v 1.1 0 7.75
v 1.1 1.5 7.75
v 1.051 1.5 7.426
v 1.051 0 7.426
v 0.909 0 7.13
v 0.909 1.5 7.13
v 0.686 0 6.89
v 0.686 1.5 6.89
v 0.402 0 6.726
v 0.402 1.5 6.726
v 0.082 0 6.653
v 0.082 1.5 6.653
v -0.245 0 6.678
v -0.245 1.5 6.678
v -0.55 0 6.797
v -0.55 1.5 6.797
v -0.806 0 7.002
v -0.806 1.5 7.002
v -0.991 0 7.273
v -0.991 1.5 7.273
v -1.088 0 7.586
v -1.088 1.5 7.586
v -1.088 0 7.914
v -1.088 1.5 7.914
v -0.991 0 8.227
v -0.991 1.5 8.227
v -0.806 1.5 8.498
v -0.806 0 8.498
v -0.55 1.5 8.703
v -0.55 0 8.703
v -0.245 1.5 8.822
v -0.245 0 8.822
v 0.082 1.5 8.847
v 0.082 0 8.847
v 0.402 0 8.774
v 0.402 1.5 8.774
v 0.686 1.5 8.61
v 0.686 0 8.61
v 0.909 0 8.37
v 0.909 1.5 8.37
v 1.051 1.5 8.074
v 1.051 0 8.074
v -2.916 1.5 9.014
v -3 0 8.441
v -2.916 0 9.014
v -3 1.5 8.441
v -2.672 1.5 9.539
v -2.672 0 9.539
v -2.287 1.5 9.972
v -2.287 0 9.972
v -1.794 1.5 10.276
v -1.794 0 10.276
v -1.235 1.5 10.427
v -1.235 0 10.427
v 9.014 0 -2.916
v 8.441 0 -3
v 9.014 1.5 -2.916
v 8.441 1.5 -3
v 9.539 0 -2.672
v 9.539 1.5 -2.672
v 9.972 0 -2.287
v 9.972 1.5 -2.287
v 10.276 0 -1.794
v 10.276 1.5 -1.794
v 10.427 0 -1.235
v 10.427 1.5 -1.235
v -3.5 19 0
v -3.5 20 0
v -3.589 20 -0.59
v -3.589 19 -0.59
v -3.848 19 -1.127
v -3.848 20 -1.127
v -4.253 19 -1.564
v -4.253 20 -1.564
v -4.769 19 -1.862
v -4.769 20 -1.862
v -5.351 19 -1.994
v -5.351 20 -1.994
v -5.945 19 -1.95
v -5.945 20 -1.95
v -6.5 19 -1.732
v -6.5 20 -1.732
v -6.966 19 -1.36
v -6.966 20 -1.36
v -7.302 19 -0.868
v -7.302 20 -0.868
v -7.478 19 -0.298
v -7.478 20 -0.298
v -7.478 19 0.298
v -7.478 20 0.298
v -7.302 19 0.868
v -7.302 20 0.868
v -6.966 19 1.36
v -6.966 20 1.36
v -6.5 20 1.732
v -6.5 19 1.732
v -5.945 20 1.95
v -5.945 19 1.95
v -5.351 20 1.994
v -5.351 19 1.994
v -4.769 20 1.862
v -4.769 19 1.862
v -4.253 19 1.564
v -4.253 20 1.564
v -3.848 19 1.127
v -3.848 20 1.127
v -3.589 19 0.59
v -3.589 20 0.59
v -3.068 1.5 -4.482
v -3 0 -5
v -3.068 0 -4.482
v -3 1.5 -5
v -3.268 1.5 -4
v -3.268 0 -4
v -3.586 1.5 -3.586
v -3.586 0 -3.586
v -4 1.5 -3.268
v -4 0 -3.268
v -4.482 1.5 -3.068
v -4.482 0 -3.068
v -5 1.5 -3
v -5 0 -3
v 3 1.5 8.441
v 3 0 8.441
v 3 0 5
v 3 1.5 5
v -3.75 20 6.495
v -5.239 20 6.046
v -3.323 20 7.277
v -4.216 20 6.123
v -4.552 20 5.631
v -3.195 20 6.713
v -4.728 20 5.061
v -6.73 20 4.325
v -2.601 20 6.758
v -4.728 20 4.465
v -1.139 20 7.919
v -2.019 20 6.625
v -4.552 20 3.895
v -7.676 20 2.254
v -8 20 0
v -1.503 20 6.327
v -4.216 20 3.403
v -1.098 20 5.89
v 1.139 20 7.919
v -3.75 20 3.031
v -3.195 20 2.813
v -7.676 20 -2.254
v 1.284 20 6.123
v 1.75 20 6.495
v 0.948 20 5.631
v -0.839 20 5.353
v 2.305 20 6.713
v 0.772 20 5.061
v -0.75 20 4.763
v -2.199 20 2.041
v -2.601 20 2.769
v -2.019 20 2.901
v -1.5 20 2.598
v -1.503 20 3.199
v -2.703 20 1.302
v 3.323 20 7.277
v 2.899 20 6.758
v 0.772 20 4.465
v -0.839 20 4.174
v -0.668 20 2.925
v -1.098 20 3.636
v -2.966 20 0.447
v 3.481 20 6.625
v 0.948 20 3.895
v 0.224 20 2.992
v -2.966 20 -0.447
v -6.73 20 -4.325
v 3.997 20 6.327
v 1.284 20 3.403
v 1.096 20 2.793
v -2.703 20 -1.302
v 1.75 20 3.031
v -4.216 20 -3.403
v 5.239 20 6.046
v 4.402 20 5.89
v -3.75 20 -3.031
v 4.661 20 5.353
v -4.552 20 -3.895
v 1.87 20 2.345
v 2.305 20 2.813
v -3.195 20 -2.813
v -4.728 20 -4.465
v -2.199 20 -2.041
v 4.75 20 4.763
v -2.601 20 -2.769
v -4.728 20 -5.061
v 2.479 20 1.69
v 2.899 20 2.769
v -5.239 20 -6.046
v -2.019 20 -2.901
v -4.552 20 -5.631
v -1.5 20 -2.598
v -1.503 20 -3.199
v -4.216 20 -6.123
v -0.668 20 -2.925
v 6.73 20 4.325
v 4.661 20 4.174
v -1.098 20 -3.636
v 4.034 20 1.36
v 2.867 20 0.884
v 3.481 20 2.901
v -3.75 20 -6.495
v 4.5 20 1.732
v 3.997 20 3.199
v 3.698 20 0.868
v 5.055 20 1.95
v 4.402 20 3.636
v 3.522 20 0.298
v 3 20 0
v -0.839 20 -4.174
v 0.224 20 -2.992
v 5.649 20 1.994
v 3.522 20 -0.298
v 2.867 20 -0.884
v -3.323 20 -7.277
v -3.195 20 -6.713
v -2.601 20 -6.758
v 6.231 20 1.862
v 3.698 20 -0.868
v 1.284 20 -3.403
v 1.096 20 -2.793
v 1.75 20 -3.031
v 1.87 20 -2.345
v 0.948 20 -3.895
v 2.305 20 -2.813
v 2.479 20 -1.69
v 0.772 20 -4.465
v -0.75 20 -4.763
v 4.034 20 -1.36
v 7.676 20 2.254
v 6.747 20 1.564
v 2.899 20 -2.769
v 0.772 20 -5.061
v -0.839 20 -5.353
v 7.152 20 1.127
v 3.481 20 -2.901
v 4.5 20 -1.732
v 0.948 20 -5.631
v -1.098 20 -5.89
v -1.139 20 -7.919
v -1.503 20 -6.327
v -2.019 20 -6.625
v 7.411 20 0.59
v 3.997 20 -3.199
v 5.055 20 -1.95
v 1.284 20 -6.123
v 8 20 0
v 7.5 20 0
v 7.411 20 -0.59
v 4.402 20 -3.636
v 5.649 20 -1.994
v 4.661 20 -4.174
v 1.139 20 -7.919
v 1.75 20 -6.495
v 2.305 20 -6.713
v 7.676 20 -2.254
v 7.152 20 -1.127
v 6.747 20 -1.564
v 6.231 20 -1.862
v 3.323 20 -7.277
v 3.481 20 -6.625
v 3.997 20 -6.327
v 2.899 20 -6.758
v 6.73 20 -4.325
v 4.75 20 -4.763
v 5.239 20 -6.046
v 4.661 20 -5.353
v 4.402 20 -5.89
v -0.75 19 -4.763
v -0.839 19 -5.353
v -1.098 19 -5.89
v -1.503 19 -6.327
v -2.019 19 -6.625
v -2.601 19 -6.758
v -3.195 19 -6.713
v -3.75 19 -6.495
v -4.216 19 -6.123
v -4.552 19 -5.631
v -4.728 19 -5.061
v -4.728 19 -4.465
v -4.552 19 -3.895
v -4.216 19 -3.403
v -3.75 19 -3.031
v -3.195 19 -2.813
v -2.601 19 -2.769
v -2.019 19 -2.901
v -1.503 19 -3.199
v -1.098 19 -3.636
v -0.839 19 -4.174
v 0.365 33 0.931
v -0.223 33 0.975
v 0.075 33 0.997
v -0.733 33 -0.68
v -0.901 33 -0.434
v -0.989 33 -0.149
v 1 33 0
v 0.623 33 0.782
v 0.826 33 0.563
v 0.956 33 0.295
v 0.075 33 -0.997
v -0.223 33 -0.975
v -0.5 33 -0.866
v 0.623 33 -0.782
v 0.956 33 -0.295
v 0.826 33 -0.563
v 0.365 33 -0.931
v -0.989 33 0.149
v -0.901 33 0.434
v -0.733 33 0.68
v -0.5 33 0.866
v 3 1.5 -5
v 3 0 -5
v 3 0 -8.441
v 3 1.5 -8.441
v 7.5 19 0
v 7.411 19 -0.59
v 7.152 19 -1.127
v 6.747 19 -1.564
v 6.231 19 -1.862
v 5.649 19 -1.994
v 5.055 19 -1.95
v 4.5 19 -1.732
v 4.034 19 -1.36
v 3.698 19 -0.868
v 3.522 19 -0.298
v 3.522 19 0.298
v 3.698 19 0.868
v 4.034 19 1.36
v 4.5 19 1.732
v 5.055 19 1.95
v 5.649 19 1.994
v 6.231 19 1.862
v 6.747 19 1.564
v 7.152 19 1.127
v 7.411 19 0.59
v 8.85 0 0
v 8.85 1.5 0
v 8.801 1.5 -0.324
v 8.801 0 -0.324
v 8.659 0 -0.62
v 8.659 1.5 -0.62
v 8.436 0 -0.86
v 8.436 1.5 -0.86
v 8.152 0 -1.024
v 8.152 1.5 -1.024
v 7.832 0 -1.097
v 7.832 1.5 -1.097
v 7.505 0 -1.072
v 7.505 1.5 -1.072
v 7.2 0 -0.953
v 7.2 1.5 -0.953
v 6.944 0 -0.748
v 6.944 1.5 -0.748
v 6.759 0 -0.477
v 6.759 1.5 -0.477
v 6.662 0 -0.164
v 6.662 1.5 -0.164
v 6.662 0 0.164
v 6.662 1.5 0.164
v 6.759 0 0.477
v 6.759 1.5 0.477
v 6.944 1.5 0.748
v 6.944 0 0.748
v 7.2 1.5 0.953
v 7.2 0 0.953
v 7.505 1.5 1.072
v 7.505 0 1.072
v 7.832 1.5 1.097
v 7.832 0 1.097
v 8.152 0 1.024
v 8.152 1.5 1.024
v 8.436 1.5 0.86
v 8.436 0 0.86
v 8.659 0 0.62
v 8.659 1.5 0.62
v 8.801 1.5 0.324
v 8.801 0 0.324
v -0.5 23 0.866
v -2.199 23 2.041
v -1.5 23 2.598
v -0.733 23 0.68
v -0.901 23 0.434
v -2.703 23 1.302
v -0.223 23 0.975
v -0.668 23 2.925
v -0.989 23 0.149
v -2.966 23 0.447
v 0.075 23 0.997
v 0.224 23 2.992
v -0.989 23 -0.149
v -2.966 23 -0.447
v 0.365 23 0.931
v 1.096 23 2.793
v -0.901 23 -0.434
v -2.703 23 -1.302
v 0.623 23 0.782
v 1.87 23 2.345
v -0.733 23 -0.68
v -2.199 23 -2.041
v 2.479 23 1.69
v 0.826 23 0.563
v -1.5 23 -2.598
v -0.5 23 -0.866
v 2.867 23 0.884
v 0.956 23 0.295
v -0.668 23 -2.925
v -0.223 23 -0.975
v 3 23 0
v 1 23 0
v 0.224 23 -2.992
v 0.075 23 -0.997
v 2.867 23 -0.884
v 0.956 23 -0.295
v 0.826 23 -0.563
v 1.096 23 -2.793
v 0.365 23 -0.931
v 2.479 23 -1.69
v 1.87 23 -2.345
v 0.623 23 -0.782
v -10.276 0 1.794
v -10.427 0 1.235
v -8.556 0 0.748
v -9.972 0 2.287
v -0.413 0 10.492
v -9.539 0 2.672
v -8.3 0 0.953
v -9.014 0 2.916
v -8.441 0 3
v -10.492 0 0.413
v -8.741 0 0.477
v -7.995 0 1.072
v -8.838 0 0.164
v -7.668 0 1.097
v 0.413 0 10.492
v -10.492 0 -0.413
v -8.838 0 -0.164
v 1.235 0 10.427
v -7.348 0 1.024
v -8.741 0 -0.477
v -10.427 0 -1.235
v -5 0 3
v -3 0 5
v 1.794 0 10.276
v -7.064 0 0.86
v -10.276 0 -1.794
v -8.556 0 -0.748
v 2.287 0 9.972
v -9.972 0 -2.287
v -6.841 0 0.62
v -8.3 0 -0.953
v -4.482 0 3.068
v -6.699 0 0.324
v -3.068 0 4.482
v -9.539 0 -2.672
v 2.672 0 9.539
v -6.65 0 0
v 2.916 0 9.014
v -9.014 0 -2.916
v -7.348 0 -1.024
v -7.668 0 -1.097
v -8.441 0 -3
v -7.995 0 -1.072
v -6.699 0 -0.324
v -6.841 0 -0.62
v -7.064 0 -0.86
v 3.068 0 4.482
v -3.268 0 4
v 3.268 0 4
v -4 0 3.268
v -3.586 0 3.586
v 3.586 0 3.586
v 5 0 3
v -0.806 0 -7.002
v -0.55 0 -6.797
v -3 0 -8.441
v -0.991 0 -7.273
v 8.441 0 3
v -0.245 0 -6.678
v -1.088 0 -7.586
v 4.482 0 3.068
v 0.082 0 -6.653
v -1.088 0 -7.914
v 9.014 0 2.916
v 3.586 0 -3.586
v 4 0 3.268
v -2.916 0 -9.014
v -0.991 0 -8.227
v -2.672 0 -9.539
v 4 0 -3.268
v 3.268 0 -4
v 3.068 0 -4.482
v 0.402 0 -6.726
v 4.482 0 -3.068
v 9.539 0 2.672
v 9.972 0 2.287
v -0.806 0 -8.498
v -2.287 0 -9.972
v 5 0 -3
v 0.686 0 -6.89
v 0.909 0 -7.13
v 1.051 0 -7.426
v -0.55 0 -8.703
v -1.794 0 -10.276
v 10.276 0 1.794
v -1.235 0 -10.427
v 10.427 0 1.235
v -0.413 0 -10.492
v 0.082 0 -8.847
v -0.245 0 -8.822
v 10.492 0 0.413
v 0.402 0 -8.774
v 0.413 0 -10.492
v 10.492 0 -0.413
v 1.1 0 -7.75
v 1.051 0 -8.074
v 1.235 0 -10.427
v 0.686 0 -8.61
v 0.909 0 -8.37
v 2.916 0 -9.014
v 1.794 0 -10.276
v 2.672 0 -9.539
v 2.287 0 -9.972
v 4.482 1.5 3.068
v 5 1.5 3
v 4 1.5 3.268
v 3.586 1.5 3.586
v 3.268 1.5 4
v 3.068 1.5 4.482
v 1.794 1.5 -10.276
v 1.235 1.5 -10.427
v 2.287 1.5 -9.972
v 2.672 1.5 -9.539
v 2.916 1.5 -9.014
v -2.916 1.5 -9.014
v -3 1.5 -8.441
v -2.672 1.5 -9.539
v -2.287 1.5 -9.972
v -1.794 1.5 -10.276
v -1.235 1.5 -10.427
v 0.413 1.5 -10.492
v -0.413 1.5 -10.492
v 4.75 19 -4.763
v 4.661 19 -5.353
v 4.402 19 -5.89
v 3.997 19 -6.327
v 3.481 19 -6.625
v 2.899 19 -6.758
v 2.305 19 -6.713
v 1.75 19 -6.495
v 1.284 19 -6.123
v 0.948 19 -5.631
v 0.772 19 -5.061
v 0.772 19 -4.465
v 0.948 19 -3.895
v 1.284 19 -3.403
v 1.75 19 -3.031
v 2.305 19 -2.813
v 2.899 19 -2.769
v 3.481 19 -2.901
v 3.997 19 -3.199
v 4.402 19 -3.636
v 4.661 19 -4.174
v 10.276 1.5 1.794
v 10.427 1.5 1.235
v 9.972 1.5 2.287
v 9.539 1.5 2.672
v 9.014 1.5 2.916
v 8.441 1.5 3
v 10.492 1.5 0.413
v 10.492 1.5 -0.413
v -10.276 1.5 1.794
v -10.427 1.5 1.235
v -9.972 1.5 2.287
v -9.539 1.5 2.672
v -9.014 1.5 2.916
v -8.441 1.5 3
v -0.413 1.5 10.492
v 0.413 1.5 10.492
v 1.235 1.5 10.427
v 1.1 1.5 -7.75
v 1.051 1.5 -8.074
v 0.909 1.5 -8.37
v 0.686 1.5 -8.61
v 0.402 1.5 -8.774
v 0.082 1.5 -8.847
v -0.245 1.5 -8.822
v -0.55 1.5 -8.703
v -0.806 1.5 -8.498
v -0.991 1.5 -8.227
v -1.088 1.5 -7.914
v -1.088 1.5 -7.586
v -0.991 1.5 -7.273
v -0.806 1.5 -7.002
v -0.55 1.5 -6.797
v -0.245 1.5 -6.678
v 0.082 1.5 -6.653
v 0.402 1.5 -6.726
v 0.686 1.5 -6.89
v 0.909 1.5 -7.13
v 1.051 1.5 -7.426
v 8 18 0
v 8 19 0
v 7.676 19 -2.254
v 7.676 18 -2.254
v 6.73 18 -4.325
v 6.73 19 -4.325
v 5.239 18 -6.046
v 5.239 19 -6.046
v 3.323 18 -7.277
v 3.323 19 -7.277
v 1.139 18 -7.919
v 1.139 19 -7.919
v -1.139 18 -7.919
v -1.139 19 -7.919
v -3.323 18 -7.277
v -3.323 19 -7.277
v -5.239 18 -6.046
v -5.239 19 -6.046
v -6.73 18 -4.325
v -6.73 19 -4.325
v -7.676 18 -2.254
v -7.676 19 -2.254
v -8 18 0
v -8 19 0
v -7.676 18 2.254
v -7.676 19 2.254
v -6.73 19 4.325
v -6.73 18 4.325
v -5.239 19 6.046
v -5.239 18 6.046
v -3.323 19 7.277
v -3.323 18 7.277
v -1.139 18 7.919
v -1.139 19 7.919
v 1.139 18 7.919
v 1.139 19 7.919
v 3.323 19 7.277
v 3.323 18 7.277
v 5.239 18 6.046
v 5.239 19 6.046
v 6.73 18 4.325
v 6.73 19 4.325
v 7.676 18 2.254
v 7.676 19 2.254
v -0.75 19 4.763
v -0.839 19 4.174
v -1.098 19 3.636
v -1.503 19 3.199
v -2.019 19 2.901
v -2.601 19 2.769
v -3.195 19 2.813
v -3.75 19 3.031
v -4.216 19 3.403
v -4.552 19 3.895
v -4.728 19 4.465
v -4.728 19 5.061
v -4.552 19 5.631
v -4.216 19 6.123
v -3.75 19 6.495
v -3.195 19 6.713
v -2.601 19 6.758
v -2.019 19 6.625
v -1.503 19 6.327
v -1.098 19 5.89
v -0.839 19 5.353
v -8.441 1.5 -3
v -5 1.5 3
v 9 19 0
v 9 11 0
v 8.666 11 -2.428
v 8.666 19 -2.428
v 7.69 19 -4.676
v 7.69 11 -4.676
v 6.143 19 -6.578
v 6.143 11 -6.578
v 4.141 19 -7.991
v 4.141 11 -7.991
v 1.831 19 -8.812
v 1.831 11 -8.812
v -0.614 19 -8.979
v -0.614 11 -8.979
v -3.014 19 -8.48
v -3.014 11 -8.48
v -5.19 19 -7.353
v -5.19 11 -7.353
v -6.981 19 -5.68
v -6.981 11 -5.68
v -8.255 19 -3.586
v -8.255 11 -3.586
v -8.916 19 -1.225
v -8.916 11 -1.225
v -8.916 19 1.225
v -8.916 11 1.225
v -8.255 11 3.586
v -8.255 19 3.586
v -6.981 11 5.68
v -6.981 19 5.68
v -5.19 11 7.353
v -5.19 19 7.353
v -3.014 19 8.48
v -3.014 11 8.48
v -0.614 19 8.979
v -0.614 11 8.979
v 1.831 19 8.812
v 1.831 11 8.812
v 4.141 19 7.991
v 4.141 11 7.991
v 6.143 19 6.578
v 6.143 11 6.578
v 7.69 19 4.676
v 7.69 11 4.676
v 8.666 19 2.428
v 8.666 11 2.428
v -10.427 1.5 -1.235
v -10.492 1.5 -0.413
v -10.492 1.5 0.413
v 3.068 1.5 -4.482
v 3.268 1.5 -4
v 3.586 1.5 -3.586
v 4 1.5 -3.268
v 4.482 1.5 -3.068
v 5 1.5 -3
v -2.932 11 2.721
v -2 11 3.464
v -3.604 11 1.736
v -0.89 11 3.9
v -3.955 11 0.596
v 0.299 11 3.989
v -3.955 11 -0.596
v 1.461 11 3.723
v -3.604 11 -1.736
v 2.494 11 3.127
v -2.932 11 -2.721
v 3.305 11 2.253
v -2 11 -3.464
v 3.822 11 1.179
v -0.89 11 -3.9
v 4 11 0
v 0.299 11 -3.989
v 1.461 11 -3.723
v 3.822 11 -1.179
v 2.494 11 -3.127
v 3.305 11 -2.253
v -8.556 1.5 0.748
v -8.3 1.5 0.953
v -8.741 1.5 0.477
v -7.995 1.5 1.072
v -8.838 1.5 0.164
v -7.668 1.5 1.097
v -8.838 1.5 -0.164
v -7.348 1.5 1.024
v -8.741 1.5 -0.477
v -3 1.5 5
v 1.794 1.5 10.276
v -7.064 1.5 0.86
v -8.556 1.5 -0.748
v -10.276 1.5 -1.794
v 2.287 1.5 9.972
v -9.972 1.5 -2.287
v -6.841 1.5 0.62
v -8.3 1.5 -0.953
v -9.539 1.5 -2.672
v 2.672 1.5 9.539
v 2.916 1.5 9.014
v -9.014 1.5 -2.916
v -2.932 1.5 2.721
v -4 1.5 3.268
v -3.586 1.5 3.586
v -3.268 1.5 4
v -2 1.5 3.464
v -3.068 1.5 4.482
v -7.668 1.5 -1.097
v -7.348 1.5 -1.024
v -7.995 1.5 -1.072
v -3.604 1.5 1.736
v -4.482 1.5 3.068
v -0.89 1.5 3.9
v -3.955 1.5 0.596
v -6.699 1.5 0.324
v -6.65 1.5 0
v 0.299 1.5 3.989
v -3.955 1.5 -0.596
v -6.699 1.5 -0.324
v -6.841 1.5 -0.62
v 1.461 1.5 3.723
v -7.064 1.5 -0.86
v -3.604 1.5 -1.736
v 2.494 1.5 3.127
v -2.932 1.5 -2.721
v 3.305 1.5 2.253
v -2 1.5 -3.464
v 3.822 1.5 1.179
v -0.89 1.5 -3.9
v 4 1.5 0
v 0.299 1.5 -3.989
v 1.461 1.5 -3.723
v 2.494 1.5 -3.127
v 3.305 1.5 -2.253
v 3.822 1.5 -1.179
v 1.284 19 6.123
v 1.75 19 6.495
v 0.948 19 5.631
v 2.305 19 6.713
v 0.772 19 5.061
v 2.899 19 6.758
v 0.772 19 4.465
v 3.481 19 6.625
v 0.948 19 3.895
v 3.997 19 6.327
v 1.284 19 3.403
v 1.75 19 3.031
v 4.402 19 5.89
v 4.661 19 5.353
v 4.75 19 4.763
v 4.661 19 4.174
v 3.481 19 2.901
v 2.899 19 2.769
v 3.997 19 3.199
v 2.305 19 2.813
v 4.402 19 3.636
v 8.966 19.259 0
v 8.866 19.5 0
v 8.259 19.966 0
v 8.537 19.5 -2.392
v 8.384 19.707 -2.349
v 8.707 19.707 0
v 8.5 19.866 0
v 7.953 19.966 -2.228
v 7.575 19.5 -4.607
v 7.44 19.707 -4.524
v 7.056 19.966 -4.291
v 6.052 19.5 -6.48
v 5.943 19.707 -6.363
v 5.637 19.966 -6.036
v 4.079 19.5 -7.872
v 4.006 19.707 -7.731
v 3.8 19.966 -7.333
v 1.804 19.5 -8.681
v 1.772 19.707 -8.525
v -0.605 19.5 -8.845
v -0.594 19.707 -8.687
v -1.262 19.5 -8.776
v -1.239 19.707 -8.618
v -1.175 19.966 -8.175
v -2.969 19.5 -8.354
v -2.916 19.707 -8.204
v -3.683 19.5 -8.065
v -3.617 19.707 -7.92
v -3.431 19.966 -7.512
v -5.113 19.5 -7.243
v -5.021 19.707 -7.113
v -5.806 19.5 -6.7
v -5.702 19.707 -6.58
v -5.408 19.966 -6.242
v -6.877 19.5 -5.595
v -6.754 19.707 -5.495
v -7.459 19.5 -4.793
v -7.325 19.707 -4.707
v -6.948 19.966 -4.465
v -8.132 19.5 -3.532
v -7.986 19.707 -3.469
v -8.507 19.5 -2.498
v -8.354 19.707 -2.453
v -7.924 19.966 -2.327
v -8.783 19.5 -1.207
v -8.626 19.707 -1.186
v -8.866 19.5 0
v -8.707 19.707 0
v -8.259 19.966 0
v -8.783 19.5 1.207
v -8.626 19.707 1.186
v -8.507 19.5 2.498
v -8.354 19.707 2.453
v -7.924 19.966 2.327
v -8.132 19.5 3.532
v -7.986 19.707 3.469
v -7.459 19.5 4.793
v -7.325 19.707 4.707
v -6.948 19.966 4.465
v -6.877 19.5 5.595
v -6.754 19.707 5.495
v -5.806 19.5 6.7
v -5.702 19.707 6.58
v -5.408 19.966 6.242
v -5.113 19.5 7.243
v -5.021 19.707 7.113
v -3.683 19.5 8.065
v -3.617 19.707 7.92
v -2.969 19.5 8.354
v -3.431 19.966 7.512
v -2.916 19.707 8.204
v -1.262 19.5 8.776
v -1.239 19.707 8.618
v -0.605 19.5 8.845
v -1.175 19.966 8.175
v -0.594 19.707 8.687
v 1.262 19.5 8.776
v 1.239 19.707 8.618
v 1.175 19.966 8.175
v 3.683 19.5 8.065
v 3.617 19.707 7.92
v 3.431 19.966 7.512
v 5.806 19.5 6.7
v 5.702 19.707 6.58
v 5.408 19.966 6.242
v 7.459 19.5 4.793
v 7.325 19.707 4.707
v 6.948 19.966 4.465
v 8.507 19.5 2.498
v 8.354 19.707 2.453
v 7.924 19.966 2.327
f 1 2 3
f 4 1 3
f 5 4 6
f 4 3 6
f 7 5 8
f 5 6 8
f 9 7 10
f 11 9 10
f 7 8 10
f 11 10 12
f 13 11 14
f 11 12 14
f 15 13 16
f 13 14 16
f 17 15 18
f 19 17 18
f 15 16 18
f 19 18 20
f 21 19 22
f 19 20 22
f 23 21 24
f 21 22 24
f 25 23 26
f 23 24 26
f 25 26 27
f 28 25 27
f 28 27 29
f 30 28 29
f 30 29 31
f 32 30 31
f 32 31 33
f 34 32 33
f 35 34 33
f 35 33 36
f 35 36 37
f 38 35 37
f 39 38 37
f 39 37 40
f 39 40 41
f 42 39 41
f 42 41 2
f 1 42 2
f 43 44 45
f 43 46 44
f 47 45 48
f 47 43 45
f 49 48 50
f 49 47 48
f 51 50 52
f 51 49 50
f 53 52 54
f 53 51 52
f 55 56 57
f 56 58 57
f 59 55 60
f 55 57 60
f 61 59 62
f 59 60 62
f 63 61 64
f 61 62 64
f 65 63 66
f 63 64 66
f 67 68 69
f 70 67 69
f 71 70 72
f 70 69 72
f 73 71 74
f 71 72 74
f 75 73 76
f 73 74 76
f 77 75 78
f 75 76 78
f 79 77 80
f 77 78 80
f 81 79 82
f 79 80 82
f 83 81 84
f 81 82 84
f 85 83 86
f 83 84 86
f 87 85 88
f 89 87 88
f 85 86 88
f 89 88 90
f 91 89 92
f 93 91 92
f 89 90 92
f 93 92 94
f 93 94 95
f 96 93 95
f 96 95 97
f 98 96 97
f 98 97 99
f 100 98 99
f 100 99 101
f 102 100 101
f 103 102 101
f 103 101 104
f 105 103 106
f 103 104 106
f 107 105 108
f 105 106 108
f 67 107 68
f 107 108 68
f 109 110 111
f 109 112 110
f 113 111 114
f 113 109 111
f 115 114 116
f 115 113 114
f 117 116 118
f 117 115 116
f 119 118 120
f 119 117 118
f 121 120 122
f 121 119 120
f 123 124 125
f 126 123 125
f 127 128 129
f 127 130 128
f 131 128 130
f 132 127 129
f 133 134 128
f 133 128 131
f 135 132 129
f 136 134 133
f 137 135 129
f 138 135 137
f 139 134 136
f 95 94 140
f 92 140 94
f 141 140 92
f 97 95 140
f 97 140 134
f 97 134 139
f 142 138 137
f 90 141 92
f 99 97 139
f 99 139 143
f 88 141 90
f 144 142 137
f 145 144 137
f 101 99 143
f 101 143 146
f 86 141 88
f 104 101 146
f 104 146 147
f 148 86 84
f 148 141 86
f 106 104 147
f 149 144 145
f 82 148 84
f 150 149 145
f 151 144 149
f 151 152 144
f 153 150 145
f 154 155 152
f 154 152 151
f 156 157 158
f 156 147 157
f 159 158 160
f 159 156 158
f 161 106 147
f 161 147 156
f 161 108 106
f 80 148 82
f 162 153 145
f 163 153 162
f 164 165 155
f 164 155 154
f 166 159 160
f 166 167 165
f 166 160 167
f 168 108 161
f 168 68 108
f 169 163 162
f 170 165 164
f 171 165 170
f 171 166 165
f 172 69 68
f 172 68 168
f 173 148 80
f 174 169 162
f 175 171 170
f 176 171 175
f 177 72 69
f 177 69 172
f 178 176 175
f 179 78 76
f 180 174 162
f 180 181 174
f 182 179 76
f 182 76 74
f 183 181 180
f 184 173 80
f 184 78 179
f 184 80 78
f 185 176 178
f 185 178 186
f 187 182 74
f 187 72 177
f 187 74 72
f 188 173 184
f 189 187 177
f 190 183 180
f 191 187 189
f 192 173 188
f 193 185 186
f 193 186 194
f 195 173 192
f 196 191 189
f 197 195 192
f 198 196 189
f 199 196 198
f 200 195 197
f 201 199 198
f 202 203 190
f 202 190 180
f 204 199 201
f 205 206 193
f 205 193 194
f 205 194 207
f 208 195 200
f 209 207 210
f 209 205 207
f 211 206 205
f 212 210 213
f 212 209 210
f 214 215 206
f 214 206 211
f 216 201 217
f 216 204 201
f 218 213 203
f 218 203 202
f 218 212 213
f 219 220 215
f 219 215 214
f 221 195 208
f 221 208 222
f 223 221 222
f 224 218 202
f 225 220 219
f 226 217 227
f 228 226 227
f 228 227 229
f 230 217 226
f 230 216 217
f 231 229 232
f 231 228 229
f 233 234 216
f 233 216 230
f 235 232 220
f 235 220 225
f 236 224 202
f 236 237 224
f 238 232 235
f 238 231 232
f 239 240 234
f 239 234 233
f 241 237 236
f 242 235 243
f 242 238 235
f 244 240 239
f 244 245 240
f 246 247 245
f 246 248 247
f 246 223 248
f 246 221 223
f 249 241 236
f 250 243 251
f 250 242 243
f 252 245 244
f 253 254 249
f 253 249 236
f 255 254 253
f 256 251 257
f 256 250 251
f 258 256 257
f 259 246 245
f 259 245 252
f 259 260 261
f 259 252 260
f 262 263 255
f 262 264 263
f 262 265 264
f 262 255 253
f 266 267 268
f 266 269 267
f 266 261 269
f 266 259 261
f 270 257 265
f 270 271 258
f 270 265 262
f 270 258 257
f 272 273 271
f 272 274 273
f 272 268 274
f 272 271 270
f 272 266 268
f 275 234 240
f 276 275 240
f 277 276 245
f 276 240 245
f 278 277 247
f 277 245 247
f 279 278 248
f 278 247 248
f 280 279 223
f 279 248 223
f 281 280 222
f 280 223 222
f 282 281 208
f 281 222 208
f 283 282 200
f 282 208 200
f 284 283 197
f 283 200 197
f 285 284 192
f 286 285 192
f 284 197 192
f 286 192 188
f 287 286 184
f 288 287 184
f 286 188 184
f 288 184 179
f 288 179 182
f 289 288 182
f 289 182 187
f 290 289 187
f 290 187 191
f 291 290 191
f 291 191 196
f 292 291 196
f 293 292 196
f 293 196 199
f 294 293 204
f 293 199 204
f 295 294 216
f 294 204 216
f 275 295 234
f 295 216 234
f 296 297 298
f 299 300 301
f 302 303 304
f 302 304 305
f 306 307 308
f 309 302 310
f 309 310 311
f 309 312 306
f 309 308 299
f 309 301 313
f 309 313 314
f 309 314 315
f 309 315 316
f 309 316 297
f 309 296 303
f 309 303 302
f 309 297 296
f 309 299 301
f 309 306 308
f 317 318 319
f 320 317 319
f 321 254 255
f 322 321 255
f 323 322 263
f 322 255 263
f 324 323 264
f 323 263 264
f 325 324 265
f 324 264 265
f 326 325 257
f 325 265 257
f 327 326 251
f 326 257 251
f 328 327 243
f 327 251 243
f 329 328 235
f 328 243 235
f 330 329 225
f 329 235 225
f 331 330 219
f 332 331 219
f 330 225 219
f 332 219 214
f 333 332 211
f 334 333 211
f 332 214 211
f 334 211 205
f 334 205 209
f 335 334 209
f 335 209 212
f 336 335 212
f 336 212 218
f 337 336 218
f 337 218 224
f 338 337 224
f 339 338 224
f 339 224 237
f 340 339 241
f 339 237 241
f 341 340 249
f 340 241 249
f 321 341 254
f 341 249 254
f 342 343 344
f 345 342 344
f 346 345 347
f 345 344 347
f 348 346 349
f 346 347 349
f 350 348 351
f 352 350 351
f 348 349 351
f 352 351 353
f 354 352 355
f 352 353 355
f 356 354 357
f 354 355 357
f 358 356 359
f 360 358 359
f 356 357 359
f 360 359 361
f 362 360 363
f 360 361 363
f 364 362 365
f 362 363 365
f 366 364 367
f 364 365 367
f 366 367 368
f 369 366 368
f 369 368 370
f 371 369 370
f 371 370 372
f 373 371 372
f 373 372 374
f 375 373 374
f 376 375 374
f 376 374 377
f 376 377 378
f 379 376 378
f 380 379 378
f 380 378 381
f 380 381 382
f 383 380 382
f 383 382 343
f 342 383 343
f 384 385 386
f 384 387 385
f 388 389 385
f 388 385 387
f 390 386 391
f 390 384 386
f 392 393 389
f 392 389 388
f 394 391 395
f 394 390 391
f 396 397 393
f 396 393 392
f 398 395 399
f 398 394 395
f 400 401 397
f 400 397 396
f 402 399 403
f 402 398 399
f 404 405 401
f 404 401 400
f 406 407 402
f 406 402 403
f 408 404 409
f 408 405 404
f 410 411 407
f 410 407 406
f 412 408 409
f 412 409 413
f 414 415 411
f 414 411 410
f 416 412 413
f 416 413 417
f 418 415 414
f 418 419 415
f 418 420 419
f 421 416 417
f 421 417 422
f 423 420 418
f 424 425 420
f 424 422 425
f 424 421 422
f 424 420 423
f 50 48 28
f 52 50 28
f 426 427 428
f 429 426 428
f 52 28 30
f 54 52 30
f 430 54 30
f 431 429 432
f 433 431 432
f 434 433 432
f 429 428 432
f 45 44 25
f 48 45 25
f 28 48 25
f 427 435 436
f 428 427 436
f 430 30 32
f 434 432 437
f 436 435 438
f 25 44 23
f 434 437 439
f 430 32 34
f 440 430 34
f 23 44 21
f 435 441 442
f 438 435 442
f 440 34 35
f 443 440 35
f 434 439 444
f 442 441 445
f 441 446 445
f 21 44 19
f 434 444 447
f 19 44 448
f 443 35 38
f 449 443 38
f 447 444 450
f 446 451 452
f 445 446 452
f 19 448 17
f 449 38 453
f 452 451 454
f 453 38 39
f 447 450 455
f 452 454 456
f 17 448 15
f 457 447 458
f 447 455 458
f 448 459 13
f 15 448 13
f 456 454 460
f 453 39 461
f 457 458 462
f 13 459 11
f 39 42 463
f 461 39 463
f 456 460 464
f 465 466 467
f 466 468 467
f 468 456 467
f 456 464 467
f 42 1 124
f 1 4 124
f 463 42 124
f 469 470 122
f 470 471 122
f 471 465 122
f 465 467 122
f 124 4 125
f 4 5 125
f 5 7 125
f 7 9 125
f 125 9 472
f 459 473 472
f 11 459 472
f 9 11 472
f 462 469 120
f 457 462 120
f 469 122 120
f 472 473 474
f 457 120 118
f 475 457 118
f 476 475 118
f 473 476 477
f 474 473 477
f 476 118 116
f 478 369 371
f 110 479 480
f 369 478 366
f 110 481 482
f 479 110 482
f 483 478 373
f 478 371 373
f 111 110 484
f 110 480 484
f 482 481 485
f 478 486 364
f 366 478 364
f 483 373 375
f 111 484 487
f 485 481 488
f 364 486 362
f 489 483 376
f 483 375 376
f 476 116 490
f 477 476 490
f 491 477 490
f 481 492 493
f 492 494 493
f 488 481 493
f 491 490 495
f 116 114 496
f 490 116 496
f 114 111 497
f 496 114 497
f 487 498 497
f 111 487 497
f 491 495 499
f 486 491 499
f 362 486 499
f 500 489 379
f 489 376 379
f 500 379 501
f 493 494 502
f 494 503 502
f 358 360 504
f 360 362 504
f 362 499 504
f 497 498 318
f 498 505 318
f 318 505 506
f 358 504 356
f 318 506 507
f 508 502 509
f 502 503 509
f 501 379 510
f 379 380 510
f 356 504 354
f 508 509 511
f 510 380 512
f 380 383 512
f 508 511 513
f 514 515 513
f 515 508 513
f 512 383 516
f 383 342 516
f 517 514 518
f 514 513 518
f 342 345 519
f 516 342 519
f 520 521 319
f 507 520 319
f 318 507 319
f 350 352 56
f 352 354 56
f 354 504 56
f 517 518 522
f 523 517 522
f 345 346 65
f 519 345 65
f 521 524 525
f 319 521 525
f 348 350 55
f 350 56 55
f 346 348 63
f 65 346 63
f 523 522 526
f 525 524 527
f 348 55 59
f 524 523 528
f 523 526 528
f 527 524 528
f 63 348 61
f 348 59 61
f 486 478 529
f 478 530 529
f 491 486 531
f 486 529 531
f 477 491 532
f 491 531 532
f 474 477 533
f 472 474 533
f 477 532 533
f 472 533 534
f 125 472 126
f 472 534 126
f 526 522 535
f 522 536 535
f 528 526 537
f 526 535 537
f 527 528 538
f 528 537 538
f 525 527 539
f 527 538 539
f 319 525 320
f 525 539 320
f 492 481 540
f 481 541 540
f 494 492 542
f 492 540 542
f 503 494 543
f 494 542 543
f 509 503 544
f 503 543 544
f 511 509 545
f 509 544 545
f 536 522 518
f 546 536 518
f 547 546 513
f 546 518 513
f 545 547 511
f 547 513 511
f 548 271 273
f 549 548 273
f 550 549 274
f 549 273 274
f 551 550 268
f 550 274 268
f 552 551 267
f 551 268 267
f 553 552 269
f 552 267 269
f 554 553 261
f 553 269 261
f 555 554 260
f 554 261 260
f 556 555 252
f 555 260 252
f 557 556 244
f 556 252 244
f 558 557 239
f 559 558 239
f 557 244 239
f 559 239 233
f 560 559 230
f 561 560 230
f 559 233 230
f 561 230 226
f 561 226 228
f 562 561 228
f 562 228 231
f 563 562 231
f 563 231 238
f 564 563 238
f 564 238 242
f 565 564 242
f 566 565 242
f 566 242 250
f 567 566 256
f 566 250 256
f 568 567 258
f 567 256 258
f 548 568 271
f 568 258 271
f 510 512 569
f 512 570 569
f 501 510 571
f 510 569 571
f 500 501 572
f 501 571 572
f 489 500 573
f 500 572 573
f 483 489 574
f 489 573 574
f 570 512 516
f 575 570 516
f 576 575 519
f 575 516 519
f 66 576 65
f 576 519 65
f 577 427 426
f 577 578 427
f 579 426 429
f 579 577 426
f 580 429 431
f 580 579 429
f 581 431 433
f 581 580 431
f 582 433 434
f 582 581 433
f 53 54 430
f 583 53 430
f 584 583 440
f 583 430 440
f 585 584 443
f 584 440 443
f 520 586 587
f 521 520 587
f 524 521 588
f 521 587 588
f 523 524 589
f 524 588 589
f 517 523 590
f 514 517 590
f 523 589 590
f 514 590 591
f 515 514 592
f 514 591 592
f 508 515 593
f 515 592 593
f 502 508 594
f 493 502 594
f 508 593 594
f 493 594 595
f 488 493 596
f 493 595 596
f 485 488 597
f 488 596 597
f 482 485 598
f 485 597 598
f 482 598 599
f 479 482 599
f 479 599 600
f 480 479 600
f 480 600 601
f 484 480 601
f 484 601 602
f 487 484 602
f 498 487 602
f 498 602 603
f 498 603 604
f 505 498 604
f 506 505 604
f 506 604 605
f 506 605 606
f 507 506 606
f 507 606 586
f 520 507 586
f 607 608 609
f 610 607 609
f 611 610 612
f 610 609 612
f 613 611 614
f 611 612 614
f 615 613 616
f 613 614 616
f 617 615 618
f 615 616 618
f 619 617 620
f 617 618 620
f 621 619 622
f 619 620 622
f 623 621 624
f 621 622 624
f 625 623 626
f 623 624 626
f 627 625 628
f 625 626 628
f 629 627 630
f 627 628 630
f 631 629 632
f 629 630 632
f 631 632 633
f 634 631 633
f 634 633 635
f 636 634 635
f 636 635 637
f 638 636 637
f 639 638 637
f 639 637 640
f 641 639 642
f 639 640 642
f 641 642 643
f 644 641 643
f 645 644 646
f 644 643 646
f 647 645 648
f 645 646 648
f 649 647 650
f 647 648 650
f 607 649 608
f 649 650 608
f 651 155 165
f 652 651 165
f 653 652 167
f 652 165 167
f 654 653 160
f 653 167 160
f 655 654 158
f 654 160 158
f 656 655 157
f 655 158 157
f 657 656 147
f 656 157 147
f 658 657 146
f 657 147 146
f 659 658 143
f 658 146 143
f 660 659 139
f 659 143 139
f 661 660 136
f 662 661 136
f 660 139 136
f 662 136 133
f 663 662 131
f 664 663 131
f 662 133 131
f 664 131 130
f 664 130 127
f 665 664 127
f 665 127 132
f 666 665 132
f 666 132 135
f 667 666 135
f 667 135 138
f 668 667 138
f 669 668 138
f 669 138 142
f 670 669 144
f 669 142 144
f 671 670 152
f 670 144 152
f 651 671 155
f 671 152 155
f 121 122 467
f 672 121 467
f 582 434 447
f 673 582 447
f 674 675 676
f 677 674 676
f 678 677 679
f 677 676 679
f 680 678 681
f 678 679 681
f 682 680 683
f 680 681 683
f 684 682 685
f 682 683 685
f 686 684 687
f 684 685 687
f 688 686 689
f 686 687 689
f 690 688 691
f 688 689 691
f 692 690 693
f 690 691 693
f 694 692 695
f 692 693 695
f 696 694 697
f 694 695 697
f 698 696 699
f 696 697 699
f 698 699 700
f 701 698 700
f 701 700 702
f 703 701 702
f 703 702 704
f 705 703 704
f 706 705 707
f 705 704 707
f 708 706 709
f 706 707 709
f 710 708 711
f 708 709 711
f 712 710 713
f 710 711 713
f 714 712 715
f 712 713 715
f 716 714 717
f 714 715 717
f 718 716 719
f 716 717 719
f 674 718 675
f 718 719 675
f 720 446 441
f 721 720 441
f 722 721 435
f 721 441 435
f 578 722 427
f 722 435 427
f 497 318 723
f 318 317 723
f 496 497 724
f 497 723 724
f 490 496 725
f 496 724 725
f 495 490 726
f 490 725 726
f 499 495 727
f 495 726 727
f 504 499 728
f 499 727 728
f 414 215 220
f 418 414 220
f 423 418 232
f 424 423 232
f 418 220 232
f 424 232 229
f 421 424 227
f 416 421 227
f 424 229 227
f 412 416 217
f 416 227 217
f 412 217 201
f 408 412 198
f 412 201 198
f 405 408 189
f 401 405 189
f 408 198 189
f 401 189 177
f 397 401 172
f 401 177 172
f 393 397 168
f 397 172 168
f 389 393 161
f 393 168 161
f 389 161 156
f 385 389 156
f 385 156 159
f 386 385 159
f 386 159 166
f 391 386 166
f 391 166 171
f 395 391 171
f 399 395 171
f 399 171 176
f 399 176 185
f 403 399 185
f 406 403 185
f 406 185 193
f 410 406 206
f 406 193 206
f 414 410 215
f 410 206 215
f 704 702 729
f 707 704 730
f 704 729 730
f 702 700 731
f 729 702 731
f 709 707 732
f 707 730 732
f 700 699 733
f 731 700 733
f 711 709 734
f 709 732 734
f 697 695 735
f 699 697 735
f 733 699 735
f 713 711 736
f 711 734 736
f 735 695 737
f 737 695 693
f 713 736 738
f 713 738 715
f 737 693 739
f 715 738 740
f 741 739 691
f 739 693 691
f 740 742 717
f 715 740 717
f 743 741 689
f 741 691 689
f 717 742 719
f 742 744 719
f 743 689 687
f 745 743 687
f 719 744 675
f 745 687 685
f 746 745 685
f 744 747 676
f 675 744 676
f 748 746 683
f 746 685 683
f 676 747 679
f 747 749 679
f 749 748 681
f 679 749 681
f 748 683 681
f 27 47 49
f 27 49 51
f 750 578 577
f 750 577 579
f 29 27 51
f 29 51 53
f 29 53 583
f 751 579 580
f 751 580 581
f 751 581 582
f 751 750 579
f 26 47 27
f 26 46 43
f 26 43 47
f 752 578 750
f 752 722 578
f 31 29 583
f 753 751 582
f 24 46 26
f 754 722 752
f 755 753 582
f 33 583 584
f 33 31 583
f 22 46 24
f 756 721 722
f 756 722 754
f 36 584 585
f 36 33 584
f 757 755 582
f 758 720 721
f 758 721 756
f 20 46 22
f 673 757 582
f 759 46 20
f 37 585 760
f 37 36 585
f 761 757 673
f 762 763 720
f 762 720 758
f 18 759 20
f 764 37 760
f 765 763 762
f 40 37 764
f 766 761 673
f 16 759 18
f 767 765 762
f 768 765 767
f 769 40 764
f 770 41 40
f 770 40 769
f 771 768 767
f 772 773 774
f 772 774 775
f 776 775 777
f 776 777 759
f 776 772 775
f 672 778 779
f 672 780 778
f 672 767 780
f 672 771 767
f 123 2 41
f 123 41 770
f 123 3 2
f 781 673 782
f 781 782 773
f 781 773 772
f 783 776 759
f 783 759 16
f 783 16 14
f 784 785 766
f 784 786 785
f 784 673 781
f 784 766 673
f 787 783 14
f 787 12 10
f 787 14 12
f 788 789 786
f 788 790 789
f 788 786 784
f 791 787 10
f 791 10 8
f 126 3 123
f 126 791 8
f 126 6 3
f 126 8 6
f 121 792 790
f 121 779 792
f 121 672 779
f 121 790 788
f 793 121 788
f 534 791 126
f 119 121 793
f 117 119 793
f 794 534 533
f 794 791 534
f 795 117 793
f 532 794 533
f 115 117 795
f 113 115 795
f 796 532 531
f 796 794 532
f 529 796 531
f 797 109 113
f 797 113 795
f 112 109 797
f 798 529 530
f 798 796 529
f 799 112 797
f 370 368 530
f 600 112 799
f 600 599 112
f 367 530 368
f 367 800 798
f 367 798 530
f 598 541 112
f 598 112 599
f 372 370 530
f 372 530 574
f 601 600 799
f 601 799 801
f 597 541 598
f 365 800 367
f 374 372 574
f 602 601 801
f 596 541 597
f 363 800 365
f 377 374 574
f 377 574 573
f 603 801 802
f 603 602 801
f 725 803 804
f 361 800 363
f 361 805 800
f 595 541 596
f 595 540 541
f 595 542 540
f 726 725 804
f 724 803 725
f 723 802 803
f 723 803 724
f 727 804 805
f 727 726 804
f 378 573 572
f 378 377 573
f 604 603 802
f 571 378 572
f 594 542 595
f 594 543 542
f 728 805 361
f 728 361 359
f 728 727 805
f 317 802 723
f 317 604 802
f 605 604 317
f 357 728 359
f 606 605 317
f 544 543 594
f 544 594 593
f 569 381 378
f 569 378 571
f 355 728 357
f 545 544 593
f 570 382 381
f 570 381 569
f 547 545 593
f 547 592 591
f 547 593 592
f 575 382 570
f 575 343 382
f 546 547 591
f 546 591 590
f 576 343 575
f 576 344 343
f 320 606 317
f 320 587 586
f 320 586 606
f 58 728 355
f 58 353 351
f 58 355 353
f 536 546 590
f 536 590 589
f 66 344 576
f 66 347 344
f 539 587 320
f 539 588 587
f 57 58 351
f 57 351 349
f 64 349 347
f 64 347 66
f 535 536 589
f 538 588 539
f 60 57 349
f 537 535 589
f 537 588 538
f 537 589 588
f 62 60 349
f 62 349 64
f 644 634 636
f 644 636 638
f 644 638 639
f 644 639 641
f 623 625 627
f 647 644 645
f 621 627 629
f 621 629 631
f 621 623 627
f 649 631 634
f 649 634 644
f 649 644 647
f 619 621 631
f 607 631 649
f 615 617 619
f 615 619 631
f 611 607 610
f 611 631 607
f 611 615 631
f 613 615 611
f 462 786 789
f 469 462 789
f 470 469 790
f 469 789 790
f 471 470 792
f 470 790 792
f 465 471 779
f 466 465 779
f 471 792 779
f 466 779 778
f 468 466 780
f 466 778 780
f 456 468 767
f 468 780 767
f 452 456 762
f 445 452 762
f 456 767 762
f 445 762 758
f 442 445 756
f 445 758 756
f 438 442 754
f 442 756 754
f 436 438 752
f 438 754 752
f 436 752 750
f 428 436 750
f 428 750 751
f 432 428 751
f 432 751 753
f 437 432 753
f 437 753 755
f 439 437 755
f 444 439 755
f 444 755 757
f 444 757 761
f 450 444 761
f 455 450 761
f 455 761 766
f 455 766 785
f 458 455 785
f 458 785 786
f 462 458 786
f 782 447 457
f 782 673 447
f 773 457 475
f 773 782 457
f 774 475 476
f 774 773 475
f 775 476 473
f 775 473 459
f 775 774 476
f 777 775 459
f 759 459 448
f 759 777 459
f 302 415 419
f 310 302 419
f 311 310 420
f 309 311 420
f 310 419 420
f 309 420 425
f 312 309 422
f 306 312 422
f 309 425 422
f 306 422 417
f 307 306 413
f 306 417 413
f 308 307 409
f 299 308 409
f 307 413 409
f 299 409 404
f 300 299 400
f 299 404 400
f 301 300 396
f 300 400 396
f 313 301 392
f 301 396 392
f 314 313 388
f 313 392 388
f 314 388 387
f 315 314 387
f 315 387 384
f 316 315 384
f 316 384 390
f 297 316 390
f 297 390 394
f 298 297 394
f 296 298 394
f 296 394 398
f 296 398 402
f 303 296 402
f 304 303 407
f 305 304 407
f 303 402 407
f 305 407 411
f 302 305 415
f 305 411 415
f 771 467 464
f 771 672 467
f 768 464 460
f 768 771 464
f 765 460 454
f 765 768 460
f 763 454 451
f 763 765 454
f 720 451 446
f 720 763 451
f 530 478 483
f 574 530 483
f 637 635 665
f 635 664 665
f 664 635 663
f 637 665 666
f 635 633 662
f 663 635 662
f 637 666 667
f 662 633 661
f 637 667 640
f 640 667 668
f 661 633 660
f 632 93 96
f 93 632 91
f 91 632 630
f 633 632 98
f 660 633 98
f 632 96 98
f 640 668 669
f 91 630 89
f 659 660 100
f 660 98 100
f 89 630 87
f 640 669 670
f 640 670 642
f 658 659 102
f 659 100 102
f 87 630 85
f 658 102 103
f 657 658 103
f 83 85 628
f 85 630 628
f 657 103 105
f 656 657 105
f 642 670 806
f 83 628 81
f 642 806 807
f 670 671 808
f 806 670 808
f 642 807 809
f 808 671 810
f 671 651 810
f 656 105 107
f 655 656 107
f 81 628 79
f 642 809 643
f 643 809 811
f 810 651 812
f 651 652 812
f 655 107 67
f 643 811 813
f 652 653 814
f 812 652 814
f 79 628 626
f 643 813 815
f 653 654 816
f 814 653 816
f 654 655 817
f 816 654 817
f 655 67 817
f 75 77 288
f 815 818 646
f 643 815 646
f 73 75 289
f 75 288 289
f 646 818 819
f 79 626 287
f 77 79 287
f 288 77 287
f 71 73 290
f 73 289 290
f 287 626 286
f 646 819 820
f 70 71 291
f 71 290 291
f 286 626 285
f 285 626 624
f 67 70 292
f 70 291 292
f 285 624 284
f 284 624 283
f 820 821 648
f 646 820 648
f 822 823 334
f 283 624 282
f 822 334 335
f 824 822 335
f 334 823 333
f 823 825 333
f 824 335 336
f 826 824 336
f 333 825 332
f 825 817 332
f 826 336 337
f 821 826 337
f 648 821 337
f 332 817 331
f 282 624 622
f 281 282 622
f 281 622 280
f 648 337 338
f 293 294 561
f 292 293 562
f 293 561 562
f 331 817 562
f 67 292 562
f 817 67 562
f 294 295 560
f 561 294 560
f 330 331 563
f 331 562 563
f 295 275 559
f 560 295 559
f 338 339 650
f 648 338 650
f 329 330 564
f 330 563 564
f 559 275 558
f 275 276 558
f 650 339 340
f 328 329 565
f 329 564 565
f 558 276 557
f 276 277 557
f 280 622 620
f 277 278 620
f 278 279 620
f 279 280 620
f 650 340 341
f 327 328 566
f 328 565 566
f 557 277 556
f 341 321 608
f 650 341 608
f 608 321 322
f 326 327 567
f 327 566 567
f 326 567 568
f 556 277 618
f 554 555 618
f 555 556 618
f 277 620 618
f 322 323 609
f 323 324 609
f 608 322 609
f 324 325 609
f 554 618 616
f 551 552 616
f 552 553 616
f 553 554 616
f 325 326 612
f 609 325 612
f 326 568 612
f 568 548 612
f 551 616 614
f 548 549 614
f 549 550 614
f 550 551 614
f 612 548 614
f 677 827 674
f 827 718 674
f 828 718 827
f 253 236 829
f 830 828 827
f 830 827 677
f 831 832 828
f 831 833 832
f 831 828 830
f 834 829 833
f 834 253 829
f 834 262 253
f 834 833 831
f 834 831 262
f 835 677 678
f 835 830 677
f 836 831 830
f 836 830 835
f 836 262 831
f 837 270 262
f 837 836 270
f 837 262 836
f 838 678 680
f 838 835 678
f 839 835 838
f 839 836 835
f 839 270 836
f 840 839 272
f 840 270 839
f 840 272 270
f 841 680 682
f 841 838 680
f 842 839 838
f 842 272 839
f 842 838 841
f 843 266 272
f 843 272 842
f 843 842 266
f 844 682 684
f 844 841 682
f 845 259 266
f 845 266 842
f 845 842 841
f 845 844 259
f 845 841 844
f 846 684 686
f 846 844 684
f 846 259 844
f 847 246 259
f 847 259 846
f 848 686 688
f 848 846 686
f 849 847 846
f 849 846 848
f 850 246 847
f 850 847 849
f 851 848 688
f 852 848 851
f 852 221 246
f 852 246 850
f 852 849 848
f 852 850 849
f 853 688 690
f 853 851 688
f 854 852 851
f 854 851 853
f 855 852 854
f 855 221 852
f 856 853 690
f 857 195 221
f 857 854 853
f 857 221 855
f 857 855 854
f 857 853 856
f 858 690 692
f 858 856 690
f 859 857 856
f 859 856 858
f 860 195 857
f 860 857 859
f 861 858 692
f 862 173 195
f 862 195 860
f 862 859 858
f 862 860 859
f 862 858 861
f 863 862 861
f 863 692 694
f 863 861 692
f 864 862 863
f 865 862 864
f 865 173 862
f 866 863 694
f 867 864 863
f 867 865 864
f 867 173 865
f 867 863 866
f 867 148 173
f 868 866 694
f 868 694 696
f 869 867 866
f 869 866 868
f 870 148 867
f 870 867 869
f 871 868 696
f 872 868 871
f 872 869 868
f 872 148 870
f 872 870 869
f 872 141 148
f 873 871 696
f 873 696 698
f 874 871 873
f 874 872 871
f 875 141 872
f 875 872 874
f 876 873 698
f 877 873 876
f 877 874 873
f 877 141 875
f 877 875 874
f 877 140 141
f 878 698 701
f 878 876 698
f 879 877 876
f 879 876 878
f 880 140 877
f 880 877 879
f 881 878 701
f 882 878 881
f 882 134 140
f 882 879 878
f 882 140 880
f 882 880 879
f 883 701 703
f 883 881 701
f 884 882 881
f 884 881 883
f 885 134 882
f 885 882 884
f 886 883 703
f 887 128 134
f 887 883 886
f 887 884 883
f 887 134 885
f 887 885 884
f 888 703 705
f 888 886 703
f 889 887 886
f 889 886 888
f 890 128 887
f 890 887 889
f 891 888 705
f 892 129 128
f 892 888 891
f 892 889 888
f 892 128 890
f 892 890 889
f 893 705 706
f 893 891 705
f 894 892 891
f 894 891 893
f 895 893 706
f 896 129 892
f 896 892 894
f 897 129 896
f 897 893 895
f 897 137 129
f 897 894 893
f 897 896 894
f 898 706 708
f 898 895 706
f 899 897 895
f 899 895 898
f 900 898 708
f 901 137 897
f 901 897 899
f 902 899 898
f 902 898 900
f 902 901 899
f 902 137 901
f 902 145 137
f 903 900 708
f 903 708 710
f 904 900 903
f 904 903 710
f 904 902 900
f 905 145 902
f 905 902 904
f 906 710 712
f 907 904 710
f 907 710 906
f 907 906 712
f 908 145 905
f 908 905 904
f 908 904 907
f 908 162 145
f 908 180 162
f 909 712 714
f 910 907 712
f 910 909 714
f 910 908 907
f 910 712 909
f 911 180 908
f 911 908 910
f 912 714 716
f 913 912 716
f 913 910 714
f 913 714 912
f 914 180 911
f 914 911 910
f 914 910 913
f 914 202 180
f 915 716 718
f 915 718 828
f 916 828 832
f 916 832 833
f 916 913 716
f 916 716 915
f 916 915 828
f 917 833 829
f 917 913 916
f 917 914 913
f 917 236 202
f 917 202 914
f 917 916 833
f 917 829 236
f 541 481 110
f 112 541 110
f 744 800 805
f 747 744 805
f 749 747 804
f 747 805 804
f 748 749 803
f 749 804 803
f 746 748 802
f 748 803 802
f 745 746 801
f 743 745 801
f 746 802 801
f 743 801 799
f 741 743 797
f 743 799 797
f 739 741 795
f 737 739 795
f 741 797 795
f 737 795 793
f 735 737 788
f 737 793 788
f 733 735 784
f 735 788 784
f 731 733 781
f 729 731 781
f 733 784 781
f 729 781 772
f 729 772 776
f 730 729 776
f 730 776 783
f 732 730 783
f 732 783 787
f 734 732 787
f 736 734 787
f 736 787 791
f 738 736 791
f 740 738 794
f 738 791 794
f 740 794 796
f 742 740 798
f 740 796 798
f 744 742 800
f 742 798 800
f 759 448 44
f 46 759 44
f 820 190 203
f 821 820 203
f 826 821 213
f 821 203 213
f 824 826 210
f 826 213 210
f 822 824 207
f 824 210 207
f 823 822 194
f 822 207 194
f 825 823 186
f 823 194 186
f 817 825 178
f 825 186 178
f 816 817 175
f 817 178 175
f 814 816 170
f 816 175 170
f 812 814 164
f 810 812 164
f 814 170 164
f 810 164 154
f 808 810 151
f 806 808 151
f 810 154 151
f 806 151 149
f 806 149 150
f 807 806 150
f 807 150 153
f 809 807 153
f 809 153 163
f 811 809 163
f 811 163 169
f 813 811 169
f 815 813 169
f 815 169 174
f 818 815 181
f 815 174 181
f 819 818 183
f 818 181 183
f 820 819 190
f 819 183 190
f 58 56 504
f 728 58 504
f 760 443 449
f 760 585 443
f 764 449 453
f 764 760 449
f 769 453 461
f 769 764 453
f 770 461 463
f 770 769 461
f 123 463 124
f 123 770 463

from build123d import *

# Parameters (mm, degrees)
BOSS_EXTRUDE1_DEPTH = 1.5
SKETCH2_R           = 1.1
CUT_EXTRUDE1_DEPTH  = 2.5
FILLET1_R           = 2
SKETCH3_R           = 4
BOSS_EXTRUDE2_DEPTH = 9.5
SKETCH4_R           = 9
BOSS_EXTRUDE3_DEPTH = 9
FILLET2_R           = 1
SKETCH5_R           = 3
BOSS_EXTRUDE4_DEPTH = 3
SKETCH6_R           = 1
BOSS_EXTRUDE5_DEPTH = 10
SKETCH7_R           = 2
CUT_EXTRUDE2_DEPTH  = 1
SKETCH8_R           = 8
CUT_EXTRUDE3_DEPTH  = 1


with BuildPart() as part:
    # Sketch1 → Boss-Extrude1 (new body)
    with BuildSketch(Plane(origin=(0, 0, 0), x_dir=(1, 0, 0), z_dir=(0, 1, 0))):
        with BuildLine():
            Line((-3, 10.062305899), (-3, 3))
            Line((-3, 3), (-10.062305899, 3))
            ThreePointArc((-10.062305899, 3), (-10.5, 0), (-10.062305899, -3))
            Line((-10.062305899, -3), (-3, -3))
            Line((-3, -3), (-3, -10.062305899))
            ThreePointArc((-3, -10.062305899), (0, -10.5), (3, -10.062305899))
            Line((3, -10.062305899), (3, -3))
            Line((3, -3), (10.062305899, -3))
            ThreePointArc((10.062305899, -3), (10.5, 0), (10.062305899, 3))
            Line((10.062305899, 3), (3, 3))
            Line((3, 3), (3, 10.062305899))
            ThreePointArc((3, 10.062305899), (0, 10.5), (-3, 10.062305899))
        make_face()
    extrude(amount=BOSS_EXTRUDE1_DEPTH)

    # Sketch2 → Cut-Extrude1 (cut, through all)
    with BuildSketch(Plane(origin=(0, 1.5, 0), x_dir=(1, 0, 0), z_dir=(0, 1, 0))):
        with Locations((-7.75, 0)):
            Circle(SKETCH2_R)
        with Locations((0, 7.75)):
            Circle(SKETCH2_R)
        with Locations((7.75, 0)):
            Circle(SKETCH2_R)
        with Locations((0, -7.75)):
            Circle(SKETCH2_R)
    extrude(amount=-CUT_EXTRUDE1_DEPTH, mode=Mode.SUBTRACT)

    # Fillet1
    fillet1_edges = [part.edges().sort_by_distance(p)[0] for p in [
        (3, 0.75, 3),
        (3, 0.75, 10.062305899),
        (-3, 0.75, 10.062305899),
        (-3, 0.75, 3),
        (-10.062305899, 0.75, 3),
        (-10.062305899, 0.75, -3),
        (-3, 0.75, -3),
        (-3, 0.75, -10.062305899),
        (3, 0.75, -10.062305899),
        (3, 0.75, -3),
        (10.062305899, 0.75, -3),
        (10.062305899, 0.75, 3),
    ]]
    fillet(fillet1_edges, radius=FILLET1_R)

    # Sketch3 → Boss-Extrude2 (add)
    with BuildSketch(Plane(origin=(0, 1.5, 0), x_dir=(1, 0, 0), z_dir=(0, 1, 0))):
        Circle(SKETCH3_R)
    extrude(amount=BOSS_EXTRUDE2_DEPTH)

    # Sketch4 → Boss-Extrude3 (add)
    with BuildSketch(Plane(origin=(0, 11, 0), x_dir=(1, 0, 0), z_dir=(0, 1, 0))):
        Circle(SKETCH4_R)
    extrude(amount=BOSS_EXTRUDE3_DEPTH)

    # Fillet2
    fillet2_edges = [part.edges().sort_by_distance(p)[0] for p in [
        (-9, 20, 0),
    ]]
    fillet(fillet2_edges, radius=FILLET2_R)

    # Sketch5 → Boss-Extrude4 (add)
    with BuildSketch(Plane(origin=(0, 20, 0), x_dir=(1, 0, 0), z_dir=(0, 1, 0))):
        Circle(SKETCH5_R)
    extrude(amount=BOSS_EXTRUDE4_DEPTH)

    # Sketch6 → Boss-Extrude5 (add)
    with BuildSketch(Plane(origin=(0, 23, 0), x_dir=(1, 0, 0), z_dir=(0, 1, 0))):
        Circle(SKETCH6_R)
    extrude(amount=BOSS_EXTRUDE5_DEPTH)

    # Sketch7 → Cut-Extrude2 (cut)
    with BuildSketch(Plane(origin=(0, 20, 0), x_dir=(1, 0, 0), z_dir=(0, 1, 0))):
        with Locations((-5.5, 0)):
            Circle(SKETCH7_R)
        with Locations((-2.75, 4.763139721)):
            Circle(SKETCH7_R)
        with Locations((2.75, 4.763139721)):
            Circle(SKETCH7_R)
        with Locations((5.5, 0)):
            Circle(SKETCH7_R)
        with Locations((2.75, -4.763139721)):
            Circle(SKETCH7_R)
        with Locations((-2.75, -4.763139721)):
            Circle(SKETCH7_R)
    extrude(amount=-CUT_EXTRUDE2_DEPTH, mode=Mode.SUBTRACT)

    # Sketch8 → Cut-Extrude3 (cut)
    with BuildSketch(Plane(origin=(0, 19, 0), x_dir=(1, 0, 0), z_dir=(0, 1, 0))):
        Circle(SKETCH8_R)
    extrude(amount=-CUT_EXTRUDE3_DEPTH, mode=Mode.SUBTRACT)


solid = part.part
